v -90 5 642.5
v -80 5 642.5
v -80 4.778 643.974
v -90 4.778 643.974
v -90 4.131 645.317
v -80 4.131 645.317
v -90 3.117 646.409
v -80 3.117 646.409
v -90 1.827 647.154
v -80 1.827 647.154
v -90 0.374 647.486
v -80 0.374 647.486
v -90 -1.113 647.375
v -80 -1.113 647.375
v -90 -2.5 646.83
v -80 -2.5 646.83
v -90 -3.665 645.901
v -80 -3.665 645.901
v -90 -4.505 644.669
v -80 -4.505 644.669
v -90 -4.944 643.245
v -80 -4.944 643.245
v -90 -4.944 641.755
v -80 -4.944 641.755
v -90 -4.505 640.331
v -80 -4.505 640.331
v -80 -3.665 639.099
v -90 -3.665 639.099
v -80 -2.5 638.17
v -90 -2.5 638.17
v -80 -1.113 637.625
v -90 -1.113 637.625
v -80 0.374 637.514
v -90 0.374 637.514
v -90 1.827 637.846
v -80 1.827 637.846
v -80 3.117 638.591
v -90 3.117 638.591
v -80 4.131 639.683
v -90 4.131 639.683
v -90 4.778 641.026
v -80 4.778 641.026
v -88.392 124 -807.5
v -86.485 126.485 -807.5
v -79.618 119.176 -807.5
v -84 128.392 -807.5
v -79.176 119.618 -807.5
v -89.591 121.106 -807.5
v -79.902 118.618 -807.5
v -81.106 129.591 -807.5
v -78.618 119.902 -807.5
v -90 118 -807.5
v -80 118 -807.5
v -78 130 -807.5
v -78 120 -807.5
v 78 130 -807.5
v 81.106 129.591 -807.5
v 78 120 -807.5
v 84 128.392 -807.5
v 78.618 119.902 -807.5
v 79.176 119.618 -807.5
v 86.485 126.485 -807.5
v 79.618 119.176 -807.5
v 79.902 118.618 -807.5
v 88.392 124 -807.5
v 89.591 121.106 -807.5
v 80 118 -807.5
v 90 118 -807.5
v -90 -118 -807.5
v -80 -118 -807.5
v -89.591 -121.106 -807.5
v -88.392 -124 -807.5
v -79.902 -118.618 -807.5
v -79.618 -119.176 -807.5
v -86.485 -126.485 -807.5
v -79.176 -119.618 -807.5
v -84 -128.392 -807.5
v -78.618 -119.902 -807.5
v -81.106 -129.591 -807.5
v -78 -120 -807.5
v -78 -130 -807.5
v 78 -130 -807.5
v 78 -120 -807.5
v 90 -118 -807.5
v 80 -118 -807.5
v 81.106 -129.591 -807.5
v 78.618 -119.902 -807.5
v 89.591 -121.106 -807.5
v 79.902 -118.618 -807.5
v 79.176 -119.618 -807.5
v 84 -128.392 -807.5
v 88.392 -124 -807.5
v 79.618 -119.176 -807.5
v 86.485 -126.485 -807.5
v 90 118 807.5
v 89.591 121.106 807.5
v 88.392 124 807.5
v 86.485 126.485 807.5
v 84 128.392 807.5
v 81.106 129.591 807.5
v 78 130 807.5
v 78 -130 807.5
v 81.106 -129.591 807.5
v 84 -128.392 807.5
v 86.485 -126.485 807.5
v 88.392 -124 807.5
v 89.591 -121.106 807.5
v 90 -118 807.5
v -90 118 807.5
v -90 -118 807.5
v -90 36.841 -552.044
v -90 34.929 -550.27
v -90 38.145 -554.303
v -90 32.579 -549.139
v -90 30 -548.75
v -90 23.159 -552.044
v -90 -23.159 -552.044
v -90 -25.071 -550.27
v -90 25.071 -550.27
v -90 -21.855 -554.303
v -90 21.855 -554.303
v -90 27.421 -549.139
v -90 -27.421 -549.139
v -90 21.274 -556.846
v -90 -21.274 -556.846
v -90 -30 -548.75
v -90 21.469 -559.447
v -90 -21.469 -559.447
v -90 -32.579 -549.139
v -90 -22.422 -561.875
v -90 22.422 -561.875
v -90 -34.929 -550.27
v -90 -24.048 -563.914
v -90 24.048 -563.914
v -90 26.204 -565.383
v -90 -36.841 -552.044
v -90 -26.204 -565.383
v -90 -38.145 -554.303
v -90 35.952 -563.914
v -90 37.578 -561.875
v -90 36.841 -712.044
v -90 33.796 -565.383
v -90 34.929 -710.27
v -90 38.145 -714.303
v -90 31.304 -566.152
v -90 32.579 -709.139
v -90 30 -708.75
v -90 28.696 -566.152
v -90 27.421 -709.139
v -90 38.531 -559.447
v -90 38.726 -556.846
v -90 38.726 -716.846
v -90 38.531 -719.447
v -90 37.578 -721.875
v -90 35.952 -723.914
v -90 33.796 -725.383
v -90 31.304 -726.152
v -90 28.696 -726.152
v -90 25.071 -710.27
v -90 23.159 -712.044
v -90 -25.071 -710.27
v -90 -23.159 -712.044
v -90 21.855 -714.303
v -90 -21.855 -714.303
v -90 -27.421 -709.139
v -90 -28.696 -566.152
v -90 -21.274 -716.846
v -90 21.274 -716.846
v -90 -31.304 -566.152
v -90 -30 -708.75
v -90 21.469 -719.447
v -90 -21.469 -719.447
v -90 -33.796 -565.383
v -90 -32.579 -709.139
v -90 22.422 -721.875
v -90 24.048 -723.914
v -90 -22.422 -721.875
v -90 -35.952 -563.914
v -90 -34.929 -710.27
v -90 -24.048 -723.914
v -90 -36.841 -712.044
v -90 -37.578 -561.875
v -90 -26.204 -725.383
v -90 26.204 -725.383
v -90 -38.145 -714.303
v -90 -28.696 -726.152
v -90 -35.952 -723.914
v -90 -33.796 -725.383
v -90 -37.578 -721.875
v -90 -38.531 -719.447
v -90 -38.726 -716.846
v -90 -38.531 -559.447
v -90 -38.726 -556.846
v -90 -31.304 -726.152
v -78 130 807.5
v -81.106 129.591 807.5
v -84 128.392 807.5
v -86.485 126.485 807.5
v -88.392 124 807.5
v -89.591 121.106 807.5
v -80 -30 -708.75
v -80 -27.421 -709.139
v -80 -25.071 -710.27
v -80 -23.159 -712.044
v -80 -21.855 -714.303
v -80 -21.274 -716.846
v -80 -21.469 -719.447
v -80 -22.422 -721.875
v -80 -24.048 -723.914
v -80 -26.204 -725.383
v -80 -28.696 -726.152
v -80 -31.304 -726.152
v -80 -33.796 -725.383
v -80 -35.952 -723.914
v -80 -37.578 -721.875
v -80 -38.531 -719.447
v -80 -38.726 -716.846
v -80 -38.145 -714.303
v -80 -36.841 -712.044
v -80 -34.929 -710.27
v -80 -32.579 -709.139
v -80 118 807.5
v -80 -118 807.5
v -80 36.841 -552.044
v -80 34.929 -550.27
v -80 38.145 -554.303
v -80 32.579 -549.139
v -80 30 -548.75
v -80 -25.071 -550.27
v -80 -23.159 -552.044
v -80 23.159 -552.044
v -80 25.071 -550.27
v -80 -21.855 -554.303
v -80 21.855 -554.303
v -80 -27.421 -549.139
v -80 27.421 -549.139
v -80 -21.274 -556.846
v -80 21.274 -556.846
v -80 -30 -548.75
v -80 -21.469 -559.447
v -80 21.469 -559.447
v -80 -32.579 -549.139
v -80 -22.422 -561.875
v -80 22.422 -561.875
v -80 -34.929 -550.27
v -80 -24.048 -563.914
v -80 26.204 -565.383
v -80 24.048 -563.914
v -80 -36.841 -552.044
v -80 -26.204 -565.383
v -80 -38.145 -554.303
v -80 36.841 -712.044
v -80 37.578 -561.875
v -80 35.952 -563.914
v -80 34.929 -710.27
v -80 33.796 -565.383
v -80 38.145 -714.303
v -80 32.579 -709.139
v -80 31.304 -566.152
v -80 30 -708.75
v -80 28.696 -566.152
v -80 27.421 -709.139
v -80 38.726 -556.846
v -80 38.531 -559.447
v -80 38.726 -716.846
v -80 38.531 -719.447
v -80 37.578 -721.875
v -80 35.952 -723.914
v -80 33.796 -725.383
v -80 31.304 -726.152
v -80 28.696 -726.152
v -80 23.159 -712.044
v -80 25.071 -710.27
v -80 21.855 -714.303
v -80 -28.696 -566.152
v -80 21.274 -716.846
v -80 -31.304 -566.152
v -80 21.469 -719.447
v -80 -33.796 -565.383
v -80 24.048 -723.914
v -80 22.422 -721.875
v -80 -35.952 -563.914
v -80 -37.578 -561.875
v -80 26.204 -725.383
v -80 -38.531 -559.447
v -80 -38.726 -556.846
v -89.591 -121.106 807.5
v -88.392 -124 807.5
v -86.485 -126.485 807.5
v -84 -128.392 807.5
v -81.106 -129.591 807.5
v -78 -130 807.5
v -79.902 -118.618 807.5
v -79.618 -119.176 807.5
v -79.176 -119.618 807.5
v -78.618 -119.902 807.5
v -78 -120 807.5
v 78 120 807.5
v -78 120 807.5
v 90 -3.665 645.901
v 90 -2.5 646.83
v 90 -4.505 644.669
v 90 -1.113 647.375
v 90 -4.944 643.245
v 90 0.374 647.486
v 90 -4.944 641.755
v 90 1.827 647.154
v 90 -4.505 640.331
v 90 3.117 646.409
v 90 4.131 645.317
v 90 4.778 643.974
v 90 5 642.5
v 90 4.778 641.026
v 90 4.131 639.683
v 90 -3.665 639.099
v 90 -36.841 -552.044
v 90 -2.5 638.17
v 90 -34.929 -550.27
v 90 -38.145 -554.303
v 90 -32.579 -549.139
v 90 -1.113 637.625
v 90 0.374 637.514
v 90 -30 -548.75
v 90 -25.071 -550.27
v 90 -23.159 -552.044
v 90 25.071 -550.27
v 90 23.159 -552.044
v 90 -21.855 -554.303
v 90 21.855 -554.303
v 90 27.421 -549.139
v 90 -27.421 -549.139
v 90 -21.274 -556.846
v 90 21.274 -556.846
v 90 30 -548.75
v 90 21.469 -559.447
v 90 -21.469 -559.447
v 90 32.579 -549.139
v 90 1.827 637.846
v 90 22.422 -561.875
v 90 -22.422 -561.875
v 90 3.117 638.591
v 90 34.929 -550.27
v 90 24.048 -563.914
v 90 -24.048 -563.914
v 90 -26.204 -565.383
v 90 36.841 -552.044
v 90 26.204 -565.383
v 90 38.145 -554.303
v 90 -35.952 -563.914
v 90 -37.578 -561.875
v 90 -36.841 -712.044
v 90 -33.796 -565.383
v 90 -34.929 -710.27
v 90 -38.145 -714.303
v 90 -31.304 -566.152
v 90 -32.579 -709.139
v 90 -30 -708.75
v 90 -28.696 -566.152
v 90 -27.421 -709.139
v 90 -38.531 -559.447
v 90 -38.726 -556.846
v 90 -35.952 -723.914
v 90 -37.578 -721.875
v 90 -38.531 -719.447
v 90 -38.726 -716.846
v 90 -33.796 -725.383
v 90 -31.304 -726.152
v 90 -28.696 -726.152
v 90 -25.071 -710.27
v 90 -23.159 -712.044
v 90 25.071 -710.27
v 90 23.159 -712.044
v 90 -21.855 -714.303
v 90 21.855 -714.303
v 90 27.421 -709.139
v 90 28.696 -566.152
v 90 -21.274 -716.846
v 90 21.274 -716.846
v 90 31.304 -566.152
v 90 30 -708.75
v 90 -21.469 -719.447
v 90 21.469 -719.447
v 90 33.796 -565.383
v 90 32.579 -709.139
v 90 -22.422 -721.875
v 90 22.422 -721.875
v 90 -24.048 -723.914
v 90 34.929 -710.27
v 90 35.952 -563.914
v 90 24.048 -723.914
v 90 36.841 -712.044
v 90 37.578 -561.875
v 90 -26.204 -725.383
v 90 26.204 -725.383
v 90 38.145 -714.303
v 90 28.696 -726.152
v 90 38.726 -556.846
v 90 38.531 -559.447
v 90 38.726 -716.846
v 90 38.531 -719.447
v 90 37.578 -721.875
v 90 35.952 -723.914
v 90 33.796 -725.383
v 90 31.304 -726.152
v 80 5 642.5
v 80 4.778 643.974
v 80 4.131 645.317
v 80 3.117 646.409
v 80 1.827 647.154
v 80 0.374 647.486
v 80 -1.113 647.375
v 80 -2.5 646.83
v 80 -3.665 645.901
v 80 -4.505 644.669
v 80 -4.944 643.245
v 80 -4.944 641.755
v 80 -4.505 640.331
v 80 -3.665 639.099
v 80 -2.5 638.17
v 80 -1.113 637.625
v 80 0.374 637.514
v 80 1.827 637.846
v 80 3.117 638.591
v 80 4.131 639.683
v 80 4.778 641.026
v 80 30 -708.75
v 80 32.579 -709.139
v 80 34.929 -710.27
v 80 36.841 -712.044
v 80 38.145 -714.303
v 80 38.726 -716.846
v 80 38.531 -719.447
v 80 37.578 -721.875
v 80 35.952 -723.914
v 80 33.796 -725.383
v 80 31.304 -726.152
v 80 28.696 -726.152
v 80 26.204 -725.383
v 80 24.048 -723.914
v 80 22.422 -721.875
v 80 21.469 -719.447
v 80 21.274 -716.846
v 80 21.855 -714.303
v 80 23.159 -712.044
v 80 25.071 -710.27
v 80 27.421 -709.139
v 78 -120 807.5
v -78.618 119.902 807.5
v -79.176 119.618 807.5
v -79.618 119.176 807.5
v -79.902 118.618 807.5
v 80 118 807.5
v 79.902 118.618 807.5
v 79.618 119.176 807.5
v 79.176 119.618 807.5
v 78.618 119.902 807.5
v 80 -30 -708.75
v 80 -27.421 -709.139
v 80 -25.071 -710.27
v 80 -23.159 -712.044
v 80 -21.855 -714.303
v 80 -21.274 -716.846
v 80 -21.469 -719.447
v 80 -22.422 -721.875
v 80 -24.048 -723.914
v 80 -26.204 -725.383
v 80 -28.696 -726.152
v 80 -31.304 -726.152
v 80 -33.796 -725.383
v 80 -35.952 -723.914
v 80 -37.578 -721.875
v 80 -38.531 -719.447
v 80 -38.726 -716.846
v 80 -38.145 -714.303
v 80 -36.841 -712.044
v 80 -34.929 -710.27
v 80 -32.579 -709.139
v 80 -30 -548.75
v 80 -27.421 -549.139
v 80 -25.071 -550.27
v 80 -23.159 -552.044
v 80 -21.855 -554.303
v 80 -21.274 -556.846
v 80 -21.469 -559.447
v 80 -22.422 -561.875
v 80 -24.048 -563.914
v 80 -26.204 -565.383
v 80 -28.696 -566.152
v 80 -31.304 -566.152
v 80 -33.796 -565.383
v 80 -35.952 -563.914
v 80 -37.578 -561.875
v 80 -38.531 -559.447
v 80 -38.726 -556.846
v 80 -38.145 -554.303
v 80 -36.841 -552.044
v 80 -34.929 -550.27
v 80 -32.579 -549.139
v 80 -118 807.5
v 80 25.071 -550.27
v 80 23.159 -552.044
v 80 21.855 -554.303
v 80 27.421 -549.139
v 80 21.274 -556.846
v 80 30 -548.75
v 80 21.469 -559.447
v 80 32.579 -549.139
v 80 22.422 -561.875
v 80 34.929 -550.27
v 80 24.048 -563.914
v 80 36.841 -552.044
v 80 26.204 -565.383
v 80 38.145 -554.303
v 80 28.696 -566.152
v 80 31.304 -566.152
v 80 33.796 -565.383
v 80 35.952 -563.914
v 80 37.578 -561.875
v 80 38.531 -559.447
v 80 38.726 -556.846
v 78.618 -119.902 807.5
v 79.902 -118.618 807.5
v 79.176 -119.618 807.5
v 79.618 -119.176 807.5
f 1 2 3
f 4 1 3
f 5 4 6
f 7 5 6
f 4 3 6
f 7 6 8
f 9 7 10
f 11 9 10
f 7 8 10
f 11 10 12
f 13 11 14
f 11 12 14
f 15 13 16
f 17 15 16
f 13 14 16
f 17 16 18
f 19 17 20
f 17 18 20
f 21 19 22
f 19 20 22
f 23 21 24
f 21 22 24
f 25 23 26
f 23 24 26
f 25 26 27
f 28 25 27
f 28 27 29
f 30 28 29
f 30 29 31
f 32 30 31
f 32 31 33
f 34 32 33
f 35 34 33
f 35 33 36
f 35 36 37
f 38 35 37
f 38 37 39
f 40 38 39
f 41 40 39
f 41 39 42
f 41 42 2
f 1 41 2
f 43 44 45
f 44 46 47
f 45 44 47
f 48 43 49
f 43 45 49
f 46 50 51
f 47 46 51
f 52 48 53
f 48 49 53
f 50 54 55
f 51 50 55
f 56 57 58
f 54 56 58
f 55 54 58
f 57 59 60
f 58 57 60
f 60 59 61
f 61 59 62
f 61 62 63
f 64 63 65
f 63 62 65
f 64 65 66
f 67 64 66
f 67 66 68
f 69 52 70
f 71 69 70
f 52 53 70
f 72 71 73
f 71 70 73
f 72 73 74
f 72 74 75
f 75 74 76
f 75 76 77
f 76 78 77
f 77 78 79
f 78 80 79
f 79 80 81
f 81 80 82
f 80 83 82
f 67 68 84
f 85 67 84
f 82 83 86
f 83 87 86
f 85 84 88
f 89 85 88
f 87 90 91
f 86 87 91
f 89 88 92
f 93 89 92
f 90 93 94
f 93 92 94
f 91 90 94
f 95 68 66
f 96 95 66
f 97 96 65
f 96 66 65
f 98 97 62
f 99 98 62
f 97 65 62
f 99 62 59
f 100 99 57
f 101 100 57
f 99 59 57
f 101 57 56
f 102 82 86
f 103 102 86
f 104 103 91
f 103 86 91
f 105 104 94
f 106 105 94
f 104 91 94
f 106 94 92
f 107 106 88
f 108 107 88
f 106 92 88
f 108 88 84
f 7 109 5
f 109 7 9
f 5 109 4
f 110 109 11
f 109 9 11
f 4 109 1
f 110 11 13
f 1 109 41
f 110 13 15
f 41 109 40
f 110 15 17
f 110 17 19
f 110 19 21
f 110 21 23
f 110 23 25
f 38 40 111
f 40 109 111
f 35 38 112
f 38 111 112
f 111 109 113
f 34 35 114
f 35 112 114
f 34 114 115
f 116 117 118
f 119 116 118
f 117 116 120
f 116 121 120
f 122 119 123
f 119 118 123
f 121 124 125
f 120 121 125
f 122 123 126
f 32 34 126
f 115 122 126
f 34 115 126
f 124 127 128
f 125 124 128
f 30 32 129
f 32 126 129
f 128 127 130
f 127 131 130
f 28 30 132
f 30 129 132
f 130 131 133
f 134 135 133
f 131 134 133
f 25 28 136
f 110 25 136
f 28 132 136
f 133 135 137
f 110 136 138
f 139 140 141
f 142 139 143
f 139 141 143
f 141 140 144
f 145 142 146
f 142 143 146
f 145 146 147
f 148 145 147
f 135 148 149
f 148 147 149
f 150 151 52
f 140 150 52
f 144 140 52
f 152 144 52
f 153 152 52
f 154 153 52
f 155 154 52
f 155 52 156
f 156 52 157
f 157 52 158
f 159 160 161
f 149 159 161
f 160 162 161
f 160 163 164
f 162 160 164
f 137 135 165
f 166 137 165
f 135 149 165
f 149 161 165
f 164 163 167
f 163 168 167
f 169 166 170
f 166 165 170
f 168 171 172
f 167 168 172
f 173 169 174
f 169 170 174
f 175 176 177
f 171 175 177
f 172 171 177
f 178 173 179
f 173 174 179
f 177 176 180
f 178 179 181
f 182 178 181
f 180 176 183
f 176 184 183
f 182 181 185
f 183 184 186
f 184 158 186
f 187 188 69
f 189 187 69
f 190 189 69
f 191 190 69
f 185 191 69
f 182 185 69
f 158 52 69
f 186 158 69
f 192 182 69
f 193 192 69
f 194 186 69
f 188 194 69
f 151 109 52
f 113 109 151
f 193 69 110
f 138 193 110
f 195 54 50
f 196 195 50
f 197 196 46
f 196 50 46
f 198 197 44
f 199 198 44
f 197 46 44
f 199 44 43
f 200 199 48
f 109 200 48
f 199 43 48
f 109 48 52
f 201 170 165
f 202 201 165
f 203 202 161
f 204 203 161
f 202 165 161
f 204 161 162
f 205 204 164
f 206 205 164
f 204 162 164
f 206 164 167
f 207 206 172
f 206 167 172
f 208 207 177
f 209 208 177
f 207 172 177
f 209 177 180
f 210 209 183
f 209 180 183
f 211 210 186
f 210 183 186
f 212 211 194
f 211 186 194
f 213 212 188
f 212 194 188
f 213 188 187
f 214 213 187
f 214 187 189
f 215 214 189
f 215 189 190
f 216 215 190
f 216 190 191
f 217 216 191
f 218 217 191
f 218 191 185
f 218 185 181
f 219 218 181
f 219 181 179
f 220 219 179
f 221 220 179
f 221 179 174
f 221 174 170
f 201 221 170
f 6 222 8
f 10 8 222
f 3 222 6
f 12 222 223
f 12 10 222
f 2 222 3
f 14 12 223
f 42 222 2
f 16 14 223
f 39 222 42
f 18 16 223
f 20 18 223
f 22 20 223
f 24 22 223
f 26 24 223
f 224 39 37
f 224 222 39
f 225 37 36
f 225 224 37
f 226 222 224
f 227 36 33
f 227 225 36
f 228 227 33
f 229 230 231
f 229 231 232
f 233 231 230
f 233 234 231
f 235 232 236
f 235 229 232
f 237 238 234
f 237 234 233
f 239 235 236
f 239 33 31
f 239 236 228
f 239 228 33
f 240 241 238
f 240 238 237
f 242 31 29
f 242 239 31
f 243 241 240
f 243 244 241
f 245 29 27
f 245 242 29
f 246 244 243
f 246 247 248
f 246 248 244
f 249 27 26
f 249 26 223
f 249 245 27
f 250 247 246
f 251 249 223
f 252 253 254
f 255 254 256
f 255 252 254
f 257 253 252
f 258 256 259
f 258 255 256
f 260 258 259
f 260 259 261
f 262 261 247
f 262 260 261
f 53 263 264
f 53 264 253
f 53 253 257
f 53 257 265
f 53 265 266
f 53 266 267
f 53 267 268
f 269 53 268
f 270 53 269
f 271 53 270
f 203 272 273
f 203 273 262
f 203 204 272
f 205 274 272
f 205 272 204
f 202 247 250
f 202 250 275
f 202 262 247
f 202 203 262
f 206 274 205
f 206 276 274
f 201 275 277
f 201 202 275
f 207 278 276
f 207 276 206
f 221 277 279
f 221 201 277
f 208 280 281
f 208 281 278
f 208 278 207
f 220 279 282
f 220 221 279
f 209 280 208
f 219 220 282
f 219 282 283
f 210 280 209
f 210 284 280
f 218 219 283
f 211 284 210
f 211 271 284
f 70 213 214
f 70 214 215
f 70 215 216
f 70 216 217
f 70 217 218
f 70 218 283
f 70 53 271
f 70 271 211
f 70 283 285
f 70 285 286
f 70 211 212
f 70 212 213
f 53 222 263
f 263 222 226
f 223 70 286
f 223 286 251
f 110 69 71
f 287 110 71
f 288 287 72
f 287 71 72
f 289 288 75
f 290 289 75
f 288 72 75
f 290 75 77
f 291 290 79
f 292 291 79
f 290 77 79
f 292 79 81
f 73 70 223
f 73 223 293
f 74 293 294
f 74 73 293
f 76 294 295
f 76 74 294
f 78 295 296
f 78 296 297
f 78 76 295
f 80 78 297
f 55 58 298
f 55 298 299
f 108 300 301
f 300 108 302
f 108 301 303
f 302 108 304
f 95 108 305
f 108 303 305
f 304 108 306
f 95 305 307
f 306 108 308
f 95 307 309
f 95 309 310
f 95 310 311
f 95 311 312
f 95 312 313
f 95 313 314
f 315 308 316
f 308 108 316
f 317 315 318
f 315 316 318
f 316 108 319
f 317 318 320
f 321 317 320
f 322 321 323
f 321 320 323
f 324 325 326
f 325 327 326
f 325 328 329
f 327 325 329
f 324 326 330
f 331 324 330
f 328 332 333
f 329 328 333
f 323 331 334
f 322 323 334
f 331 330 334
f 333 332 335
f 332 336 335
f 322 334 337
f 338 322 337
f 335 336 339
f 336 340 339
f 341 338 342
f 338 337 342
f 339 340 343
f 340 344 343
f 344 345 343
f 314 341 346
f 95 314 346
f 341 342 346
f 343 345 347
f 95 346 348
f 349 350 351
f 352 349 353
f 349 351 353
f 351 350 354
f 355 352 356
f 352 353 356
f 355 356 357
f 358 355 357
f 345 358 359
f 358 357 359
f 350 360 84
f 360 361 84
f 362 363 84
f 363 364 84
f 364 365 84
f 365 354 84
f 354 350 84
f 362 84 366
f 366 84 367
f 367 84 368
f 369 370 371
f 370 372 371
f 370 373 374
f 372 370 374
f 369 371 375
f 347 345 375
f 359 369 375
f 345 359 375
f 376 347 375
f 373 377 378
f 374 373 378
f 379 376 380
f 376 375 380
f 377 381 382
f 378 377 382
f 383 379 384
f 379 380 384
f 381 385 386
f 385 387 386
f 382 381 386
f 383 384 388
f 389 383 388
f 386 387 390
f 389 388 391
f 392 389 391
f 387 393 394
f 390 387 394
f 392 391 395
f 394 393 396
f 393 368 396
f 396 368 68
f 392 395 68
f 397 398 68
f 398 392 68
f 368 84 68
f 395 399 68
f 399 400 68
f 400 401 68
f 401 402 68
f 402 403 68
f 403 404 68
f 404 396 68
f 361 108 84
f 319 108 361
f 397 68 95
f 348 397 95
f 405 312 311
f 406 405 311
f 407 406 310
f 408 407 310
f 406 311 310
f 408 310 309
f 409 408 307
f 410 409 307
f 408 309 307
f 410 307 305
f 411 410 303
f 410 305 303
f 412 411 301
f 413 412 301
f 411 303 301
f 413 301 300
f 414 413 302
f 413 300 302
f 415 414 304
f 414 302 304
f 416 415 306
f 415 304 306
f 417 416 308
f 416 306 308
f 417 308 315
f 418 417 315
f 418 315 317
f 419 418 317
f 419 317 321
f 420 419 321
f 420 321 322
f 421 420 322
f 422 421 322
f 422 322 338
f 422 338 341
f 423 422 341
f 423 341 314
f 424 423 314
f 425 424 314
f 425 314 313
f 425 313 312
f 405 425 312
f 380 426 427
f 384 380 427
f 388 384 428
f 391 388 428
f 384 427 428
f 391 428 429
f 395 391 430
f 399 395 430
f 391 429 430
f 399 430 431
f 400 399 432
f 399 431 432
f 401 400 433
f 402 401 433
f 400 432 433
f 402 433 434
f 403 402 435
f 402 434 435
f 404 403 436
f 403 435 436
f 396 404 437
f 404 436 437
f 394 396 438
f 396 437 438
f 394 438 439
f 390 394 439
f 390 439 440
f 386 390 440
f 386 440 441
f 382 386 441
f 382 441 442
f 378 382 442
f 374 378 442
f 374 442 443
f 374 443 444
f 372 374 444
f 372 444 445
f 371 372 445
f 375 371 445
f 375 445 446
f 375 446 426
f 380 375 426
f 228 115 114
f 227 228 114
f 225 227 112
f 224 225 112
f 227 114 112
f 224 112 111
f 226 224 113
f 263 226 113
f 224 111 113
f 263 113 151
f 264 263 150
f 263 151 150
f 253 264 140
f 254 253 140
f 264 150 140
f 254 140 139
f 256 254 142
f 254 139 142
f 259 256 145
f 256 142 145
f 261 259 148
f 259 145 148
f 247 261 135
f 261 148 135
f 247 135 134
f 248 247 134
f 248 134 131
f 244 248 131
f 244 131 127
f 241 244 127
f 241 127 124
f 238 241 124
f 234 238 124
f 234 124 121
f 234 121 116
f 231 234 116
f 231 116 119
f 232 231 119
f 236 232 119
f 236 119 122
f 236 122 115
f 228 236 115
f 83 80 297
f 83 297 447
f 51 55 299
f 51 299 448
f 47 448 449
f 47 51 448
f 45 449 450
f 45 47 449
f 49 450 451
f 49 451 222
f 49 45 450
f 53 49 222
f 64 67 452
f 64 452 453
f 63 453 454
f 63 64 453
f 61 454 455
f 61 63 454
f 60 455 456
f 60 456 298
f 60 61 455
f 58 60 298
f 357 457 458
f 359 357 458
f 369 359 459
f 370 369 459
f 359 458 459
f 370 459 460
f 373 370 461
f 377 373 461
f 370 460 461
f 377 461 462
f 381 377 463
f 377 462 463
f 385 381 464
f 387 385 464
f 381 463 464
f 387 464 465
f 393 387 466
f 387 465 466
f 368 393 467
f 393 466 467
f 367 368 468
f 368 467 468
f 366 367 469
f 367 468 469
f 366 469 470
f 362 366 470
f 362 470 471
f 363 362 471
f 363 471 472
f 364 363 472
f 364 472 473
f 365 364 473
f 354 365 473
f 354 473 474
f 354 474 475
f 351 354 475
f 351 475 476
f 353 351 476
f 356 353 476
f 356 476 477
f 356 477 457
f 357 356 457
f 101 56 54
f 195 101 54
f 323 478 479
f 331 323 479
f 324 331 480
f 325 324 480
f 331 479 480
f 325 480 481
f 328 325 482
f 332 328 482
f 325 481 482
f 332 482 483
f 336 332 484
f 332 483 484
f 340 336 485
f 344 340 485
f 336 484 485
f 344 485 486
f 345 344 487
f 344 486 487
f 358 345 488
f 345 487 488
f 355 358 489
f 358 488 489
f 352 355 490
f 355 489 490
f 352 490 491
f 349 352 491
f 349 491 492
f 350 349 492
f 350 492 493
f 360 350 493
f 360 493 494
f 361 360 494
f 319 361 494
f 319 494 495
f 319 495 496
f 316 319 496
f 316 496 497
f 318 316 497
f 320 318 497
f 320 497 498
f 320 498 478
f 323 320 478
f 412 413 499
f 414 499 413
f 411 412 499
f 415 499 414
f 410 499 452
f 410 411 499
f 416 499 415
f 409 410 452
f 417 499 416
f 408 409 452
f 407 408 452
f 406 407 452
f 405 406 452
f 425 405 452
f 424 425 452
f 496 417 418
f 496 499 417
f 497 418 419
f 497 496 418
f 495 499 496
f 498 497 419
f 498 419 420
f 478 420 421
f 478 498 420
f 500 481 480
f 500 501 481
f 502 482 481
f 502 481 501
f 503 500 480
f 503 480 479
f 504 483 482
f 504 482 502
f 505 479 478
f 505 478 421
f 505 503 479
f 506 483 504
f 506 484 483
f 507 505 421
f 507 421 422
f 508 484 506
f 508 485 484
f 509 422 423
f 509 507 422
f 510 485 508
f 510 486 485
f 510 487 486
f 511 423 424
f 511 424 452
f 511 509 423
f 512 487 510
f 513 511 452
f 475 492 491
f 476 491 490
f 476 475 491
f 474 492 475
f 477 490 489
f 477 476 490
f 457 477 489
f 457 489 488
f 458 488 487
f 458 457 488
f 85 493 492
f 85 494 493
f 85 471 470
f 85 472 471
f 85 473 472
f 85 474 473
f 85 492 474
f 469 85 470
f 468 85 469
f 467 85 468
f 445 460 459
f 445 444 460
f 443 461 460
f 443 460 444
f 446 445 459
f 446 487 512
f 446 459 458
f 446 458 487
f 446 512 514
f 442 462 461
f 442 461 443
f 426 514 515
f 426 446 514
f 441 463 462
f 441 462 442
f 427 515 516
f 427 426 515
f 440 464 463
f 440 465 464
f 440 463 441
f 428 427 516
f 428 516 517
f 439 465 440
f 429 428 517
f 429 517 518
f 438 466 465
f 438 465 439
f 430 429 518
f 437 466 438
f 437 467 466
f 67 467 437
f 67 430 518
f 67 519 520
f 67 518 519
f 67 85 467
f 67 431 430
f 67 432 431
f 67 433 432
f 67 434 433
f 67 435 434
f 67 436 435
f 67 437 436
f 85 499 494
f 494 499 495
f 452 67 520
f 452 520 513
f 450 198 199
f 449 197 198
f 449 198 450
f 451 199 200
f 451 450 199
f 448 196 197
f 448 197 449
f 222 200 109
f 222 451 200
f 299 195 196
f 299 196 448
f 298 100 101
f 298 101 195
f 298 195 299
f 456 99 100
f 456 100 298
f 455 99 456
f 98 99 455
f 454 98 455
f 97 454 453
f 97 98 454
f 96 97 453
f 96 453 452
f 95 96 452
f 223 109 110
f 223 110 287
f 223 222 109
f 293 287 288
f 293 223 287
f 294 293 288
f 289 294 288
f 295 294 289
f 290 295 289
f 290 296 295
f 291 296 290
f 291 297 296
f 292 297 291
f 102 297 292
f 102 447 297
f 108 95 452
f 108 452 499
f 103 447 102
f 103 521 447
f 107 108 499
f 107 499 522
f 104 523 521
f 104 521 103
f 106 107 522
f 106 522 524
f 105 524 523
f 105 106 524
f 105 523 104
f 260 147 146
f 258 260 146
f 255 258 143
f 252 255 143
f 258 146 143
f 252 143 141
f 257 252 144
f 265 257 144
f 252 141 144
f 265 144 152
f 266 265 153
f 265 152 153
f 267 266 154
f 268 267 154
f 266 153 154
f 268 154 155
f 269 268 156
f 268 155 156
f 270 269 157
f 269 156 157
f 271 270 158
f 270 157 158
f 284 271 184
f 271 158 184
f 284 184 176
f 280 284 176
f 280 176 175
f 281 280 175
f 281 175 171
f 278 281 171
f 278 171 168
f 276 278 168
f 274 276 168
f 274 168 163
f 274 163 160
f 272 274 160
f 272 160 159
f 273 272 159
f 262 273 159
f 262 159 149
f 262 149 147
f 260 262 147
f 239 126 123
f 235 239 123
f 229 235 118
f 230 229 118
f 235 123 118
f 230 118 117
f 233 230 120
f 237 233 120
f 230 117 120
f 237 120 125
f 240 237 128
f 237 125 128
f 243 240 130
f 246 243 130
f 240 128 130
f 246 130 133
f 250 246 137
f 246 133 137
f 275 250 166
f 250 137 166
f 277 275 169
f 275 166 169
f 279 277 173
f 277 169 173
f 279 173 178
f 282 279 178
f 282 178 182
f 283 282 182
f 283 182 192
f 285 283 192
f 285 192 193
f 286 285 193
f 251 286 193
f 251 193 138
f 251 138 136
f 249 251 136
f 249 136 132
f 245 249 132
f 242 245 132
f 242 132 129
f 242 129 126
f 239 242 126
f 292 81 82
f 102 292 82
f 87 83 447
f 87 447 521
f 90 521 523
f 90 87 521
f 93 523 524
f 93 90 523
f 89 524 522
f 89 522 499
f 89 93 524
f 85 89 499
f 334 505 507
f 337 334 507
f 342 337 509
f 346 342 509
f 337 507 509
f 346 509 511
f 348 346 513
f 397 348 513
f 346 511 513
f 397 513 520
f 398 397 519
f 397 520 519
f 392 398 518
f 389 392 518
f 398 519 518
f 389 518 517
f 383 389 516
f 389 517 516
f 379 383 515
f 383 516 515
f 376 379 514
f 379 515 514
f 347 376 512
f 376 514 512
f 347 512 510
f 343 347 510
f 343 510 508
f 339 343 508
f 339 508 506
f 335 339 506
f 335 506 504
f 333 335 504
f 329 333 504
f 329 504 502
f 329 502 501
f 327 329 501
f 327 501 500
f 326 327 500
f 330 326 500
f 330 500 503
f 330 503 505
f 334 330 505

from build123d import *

# Parameters (mm, degrees)
TUBE_SQUARE_TS3X3X0_3125_1_DEPTH = 1615
M20X2_5_TAPPED_HOLE1_D           = 17.5
SKETCH19_R                       = 5
CUT_EXTRUDE1_DEPTH               = 838.470148722


with BuildPart() as part:
    # Sketch14 → Tube square TS3X3X0.3125(1) (new body)
    with BuildSketch(Plane(origin=(0, 0, -807.5), x_dir=(0, -1, 0), z_dir=(0, 0, 1))):
        with BuildLine():
            Line((-118, -90), (118, -90))
            ThreePointArc((118, -90), (126.485281374, -86.485281374), (130, -78))
            Line((130, -78), (130, 78))
            ThreePointArc((130, 78), (126.485281374, 86.485281374), (118, 90))
            Line((118, 90), (-118, 90))
            ThreePointArc((-118, 90), (-126.485281374, 86.485281374), (-130, 78))
            Line((-130, 78), (-130, -78))
            ThreePointArc((-130, -78), (-126.485281374, -86.485281374), (-118, -90))
        make_face()
        with BuildLine():
            Line((-118, -80), (118, -80))
            ThreePointArc((118, -80), (119.414213562, -79.414213562), (120, -78))
            Line((120, -78), (120, 78))
            ThreePointArc((120, 78), (119.414213562, 79.414213562), (118, 80))
            Line((118, 80), (-118, 80))
            ThreePointArc((-118, 80), (-119.414213562, 79.414213562), (-120, 78))
            Line((-120, 78), (-120, -78))
            ThreePointArc((-120, -78), (-119.414213562, -79.414213562), (-118, -80))
        make_face(mode=Mode.SUBTRACT)
    extrude(amount=TUBE_SQUARE_TS3X3X0_3125_1_DEPTH)

    # M20x2.5 Tapped Hole1 (through all)
    with Locations(Plane(origin=(90, 0, 0), x_dir=(0, 0, -1), z_dir=(1, 0, 0))):
        with Locations((717.5, 30), (557.5, 30), (557.5, -30), (717.5, -30)):
            Hole(M20X2_5_TAPPED_HOLE1_D / 2)

    # Sketch19 → Cut-Extrude1 (cut, through all)
    with BuildSketch(Plane(origin=(90, 0, 0), x_dir=(0, 0, -1), z_dir=(1, 0, 0))):
        with Locations(Location((-642.5, 0, 0), (0, 0, 90))):
            Circle(SKETCH19_R)
    extrude(amount=-CUT_EXTRUDE1_DEPTH, mode=Mode.SUBTRACT)


solid = part.part
